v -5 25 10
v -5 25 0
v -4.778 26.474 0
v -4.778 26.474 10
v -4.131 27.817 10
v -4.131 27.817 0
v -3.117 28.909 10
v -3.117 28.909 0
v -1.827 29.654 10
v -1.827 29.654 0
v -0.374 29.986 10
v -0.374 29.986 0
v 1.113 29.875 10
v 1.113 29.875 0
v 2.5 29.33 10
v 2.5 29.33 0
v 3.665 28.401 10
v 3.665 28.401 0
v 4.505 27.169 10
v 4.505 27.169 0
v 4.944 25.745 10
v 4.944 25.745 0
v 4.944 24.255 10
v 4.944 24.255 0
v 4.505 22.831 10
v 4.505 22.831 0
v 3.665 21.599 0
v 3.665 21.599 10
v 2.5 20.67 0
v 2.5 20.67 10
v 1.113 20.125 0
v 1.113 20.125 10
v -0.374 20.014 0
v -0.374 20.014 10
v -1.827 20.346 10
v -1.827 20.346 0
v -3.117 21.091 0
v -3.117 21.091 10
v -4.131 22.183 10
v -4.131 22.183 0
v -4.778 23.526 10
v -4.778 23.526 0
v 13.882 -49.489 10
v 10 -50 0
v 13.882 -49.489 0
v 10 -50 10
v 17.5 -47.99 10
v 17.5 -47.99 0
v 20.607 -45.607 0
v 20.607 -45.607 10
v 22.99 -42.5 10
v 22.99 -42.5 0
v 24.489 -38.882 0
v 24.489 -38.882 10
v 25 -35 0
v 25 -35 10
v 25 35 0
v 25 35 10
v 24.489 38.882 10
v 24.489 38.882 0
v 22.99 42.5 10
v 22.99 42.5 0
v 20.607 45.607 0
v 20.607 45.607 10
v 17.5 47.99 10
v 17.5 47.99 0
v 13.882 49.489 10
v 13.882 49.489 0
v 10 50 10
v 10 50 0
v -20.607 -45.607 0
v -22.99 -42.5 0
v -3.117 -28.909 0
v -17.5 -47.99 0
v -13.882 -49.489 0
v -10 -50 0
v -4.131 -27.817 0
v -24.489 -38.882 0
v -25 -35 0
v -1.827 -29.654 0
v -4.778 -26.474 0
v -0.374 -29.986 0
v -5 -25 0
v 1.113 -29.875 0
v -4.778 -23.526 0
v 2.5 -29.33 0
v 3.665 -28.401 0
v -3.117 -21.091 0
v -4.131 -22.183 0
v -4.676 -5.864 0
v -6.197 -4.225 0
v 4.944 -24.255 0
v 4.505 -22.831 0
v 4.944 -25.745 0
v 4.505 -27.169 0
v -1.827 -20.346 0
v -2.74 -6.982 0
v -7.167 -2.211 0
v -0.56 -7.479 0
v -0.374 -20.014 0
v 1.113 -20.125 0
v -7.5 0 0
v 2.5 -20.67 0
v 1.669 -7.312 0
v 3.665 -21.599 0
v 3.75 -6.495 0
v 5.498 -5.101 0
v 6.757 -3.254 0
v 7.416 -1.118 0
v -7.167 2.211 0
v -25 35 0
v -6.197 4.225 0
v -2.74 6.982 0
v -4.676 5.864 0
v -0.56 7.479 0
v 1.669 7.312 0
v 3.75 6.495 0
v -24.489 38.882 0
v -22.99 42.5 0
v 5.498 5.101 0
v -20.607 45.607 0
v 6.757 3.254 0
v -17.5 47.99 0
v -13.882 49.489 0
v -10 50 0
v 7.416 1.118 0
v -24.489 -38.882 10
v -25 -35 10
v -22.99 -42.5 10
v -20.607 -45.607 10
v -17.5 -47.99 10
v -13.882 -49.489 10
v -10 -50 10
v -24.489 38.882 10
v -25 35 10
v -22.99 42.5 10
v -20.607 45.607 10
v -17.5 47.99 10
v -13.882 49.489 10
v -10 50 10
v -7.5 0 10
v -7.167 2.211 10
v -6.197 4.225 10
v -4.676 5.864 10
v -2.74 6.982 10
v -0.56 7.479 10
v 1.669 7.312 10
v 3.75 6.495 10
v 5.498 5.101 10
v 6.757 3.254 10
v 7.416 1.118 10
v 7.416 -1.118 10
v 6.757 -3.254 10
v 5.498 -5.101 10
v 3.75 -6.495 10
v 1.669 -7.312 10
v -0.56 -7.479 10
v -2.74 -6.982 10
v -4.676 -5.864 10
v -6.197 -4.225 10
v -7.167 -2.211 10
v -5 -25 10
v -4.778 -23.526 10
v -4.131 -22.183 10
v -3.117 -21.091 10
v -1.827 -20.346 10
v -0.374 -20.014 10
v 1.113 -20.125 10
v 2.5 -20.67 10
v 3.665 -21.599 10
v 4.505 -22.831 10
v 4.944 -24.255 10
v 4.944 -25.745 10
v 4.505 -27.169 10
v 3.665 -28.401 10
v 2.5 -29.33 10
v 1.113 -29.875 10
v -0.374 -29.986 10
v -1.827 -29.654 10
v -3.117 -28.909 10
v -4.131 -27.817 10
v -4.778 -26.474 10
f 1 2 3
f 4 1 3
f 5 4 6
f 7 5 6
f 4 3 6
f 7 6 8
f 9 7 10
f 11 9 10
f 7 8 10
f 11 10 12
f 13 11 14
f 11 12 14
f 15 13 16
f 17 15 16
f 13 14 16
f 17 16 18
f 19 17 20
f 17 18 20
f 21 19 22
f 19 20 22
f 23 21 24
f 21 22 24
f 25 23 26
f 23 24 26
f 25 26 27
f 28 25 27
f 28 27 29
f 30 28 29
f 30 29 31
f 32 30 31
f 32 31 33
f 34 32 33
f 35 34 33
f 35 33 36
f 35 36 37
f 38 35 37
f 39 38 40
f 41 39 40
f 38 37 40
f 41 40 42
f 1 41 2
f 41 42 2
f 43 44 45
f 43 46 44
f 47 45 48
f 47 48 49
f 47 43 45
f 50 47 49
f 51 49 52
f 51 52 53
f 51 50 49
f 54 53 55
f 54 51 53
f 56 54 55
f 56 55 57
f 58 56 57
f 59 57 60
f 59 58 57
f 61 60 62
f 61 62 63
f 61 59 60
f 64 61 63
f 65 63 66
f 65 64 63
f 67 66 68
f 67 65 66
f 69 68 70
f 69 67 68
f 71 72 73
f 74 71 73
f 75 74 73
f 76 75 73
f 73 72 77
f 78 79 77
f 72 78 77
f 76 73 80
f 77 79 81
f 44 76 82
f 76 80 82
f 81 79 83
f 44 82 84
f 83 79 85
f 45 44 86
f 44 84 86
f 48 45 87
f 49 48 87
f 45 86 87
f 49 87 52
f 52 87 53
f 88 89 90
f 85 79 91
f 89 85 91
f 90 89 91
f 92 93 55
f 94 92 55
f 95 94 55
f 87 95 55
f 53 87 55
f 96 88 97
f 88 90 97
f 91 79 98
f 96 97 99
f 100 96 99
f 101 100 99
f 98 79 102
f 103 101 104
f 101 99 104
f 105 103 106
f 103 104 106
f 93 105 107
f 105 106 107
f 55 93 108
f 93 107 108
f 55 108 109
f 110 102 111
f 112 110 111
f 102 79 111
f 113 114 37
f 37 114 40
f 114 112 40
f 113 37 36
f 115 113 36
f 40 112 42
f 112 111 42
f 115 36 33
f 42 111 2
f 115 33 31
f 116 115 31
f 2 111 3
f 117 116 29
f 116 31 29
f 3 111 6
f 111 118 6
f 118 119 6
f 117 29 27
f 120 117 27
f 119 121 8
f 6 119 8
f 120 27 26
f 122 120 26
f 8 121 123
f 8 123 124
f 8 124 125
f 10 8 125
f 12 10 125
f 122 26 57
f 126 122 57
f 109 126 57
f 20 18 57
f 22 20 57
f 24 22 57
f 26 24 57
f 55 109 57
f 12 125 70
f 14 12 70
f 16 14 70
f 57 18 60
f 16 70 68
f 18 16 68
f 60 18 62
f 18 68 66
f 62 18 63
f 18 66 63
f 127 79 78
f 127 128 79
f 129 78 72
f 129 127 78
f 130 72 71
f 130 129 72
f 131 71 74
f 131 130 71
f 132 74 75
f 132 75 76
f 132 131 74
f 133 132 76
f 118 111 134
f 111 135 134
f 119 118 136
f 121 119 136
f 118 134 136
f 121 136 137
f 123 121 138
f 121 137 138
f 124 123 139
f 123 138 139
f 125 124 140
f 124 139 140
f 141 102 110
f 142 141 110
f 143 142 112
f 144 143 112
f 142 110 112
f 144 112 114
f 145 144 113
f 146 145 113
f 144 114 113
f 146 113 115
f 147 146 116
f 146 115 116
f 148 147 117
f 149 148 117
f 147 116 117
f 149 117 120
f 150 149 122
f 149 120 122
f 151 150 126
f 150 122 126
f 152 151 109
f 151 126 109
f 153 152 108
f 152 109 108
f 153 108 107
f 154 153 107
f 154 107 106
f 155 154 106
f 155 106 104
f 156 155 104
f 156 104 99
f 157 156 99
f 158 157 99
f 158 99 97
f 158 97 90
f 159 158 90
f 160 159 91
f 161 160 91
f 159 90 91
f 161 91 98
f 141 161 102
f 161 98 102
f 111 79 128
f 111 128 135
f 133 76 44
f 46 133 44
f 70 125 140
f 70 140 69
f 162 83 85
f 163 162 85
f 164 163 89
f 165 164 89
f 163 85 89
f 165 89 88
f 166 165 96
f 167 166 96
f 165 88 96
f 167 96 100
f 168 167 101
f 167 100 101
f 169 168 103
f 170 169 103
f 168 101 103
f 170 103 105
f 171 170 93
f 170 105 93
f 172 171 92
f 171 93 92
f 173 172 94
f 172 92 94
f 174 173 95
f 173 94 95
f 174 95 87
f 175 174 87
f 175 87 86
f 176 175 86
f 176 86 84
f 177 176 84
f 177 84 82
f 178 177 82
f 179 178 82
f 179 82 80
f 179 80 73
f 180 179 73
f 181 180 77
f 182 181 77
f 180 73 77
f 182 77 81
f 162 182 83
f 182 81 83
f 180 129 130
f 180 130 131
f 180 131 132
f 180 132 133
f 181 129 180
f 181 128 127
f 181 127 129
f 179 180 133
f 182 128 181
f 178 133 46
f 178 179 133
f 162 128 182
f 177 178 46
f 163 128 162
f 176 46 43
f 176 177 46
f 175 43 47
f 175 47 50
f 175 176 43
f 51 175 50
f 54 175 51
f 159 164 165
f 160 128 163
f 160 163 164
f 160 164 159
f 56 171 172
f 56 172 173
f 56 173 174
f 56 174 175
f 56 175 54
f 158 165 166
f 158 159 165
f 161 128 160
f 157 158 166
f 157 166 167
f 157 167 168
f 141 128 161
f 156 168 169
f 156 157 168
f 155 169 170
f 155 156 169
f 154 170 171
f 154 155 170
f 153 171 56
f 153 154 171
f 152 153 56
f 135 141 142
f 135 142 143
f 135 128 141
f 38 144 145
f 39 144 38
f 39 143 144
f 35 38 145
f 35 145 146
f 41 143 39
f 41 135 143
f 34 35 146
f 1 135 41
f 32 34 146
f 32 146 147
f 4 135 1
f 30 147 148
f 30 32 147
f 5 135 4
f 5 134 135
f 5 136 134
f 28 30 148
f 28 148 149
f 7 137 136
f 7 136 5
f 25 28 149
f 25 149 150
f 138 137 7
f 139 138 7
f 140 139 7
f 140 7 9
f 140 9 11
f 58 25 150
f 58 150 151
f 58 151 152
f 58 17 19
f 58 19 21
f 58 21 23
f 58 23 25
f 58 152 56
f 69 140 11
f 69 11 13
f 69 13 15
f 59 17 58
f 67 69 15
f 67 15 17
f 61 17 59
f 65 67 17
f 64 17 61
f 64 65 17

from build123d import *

# Parameters (mm, degrees)
ESQUISSE3_W             = 50
ESQUISSE3_H             = 100
BOSS_EXTRU_2_DEPTH      = 10
CONG_1_R                = 15
ESQUISSE4_R             = 5
ESQUISSE4_R_2           = 7.5
ENL_V_MAT_EXTRU_1_DEPTH = 10


with BuildPart() as part:
    # Esquisse3 → Boss.-Extru.2 (new body)
    with BuildSketch(Plane.XY):
        Rectangle(ESQUISSE3_W, ESQUISSE3_H)
    extrude(amount=BOSS_EXTRU_2_DEPTH)

    # Congé1
    cong_1_edges = [part.edges().sort_by_distance(p)[0] for p in [
        (-25, 50, 5),
        (25, 50, 5),
        (25, -50, 5),
        (-25, -50, 5),
    ]]
    fillet(cong_1_edges, radius=CONG_1_R)

    # Esquisse4 → Enlèv. mat.-Extru.1 (cut)
    with BuildSketch(Plane(origin=(0, 0, 0), x_dir=(-1, 0, 0), z_dir=(0, 0, -1))):
        with Locations((0, -25)):
            Circle(ESQUISSE4_R)
        with Locations((0, 25)):
            Circle(ESQUISSE4_R)
        Circle(ESQUISSE4_R_2)
    extrude(amount=-ENL_V_MAT_EXTRU_1_DEPTH, mode=Mode.SUBTRACT)


solid = part.part
